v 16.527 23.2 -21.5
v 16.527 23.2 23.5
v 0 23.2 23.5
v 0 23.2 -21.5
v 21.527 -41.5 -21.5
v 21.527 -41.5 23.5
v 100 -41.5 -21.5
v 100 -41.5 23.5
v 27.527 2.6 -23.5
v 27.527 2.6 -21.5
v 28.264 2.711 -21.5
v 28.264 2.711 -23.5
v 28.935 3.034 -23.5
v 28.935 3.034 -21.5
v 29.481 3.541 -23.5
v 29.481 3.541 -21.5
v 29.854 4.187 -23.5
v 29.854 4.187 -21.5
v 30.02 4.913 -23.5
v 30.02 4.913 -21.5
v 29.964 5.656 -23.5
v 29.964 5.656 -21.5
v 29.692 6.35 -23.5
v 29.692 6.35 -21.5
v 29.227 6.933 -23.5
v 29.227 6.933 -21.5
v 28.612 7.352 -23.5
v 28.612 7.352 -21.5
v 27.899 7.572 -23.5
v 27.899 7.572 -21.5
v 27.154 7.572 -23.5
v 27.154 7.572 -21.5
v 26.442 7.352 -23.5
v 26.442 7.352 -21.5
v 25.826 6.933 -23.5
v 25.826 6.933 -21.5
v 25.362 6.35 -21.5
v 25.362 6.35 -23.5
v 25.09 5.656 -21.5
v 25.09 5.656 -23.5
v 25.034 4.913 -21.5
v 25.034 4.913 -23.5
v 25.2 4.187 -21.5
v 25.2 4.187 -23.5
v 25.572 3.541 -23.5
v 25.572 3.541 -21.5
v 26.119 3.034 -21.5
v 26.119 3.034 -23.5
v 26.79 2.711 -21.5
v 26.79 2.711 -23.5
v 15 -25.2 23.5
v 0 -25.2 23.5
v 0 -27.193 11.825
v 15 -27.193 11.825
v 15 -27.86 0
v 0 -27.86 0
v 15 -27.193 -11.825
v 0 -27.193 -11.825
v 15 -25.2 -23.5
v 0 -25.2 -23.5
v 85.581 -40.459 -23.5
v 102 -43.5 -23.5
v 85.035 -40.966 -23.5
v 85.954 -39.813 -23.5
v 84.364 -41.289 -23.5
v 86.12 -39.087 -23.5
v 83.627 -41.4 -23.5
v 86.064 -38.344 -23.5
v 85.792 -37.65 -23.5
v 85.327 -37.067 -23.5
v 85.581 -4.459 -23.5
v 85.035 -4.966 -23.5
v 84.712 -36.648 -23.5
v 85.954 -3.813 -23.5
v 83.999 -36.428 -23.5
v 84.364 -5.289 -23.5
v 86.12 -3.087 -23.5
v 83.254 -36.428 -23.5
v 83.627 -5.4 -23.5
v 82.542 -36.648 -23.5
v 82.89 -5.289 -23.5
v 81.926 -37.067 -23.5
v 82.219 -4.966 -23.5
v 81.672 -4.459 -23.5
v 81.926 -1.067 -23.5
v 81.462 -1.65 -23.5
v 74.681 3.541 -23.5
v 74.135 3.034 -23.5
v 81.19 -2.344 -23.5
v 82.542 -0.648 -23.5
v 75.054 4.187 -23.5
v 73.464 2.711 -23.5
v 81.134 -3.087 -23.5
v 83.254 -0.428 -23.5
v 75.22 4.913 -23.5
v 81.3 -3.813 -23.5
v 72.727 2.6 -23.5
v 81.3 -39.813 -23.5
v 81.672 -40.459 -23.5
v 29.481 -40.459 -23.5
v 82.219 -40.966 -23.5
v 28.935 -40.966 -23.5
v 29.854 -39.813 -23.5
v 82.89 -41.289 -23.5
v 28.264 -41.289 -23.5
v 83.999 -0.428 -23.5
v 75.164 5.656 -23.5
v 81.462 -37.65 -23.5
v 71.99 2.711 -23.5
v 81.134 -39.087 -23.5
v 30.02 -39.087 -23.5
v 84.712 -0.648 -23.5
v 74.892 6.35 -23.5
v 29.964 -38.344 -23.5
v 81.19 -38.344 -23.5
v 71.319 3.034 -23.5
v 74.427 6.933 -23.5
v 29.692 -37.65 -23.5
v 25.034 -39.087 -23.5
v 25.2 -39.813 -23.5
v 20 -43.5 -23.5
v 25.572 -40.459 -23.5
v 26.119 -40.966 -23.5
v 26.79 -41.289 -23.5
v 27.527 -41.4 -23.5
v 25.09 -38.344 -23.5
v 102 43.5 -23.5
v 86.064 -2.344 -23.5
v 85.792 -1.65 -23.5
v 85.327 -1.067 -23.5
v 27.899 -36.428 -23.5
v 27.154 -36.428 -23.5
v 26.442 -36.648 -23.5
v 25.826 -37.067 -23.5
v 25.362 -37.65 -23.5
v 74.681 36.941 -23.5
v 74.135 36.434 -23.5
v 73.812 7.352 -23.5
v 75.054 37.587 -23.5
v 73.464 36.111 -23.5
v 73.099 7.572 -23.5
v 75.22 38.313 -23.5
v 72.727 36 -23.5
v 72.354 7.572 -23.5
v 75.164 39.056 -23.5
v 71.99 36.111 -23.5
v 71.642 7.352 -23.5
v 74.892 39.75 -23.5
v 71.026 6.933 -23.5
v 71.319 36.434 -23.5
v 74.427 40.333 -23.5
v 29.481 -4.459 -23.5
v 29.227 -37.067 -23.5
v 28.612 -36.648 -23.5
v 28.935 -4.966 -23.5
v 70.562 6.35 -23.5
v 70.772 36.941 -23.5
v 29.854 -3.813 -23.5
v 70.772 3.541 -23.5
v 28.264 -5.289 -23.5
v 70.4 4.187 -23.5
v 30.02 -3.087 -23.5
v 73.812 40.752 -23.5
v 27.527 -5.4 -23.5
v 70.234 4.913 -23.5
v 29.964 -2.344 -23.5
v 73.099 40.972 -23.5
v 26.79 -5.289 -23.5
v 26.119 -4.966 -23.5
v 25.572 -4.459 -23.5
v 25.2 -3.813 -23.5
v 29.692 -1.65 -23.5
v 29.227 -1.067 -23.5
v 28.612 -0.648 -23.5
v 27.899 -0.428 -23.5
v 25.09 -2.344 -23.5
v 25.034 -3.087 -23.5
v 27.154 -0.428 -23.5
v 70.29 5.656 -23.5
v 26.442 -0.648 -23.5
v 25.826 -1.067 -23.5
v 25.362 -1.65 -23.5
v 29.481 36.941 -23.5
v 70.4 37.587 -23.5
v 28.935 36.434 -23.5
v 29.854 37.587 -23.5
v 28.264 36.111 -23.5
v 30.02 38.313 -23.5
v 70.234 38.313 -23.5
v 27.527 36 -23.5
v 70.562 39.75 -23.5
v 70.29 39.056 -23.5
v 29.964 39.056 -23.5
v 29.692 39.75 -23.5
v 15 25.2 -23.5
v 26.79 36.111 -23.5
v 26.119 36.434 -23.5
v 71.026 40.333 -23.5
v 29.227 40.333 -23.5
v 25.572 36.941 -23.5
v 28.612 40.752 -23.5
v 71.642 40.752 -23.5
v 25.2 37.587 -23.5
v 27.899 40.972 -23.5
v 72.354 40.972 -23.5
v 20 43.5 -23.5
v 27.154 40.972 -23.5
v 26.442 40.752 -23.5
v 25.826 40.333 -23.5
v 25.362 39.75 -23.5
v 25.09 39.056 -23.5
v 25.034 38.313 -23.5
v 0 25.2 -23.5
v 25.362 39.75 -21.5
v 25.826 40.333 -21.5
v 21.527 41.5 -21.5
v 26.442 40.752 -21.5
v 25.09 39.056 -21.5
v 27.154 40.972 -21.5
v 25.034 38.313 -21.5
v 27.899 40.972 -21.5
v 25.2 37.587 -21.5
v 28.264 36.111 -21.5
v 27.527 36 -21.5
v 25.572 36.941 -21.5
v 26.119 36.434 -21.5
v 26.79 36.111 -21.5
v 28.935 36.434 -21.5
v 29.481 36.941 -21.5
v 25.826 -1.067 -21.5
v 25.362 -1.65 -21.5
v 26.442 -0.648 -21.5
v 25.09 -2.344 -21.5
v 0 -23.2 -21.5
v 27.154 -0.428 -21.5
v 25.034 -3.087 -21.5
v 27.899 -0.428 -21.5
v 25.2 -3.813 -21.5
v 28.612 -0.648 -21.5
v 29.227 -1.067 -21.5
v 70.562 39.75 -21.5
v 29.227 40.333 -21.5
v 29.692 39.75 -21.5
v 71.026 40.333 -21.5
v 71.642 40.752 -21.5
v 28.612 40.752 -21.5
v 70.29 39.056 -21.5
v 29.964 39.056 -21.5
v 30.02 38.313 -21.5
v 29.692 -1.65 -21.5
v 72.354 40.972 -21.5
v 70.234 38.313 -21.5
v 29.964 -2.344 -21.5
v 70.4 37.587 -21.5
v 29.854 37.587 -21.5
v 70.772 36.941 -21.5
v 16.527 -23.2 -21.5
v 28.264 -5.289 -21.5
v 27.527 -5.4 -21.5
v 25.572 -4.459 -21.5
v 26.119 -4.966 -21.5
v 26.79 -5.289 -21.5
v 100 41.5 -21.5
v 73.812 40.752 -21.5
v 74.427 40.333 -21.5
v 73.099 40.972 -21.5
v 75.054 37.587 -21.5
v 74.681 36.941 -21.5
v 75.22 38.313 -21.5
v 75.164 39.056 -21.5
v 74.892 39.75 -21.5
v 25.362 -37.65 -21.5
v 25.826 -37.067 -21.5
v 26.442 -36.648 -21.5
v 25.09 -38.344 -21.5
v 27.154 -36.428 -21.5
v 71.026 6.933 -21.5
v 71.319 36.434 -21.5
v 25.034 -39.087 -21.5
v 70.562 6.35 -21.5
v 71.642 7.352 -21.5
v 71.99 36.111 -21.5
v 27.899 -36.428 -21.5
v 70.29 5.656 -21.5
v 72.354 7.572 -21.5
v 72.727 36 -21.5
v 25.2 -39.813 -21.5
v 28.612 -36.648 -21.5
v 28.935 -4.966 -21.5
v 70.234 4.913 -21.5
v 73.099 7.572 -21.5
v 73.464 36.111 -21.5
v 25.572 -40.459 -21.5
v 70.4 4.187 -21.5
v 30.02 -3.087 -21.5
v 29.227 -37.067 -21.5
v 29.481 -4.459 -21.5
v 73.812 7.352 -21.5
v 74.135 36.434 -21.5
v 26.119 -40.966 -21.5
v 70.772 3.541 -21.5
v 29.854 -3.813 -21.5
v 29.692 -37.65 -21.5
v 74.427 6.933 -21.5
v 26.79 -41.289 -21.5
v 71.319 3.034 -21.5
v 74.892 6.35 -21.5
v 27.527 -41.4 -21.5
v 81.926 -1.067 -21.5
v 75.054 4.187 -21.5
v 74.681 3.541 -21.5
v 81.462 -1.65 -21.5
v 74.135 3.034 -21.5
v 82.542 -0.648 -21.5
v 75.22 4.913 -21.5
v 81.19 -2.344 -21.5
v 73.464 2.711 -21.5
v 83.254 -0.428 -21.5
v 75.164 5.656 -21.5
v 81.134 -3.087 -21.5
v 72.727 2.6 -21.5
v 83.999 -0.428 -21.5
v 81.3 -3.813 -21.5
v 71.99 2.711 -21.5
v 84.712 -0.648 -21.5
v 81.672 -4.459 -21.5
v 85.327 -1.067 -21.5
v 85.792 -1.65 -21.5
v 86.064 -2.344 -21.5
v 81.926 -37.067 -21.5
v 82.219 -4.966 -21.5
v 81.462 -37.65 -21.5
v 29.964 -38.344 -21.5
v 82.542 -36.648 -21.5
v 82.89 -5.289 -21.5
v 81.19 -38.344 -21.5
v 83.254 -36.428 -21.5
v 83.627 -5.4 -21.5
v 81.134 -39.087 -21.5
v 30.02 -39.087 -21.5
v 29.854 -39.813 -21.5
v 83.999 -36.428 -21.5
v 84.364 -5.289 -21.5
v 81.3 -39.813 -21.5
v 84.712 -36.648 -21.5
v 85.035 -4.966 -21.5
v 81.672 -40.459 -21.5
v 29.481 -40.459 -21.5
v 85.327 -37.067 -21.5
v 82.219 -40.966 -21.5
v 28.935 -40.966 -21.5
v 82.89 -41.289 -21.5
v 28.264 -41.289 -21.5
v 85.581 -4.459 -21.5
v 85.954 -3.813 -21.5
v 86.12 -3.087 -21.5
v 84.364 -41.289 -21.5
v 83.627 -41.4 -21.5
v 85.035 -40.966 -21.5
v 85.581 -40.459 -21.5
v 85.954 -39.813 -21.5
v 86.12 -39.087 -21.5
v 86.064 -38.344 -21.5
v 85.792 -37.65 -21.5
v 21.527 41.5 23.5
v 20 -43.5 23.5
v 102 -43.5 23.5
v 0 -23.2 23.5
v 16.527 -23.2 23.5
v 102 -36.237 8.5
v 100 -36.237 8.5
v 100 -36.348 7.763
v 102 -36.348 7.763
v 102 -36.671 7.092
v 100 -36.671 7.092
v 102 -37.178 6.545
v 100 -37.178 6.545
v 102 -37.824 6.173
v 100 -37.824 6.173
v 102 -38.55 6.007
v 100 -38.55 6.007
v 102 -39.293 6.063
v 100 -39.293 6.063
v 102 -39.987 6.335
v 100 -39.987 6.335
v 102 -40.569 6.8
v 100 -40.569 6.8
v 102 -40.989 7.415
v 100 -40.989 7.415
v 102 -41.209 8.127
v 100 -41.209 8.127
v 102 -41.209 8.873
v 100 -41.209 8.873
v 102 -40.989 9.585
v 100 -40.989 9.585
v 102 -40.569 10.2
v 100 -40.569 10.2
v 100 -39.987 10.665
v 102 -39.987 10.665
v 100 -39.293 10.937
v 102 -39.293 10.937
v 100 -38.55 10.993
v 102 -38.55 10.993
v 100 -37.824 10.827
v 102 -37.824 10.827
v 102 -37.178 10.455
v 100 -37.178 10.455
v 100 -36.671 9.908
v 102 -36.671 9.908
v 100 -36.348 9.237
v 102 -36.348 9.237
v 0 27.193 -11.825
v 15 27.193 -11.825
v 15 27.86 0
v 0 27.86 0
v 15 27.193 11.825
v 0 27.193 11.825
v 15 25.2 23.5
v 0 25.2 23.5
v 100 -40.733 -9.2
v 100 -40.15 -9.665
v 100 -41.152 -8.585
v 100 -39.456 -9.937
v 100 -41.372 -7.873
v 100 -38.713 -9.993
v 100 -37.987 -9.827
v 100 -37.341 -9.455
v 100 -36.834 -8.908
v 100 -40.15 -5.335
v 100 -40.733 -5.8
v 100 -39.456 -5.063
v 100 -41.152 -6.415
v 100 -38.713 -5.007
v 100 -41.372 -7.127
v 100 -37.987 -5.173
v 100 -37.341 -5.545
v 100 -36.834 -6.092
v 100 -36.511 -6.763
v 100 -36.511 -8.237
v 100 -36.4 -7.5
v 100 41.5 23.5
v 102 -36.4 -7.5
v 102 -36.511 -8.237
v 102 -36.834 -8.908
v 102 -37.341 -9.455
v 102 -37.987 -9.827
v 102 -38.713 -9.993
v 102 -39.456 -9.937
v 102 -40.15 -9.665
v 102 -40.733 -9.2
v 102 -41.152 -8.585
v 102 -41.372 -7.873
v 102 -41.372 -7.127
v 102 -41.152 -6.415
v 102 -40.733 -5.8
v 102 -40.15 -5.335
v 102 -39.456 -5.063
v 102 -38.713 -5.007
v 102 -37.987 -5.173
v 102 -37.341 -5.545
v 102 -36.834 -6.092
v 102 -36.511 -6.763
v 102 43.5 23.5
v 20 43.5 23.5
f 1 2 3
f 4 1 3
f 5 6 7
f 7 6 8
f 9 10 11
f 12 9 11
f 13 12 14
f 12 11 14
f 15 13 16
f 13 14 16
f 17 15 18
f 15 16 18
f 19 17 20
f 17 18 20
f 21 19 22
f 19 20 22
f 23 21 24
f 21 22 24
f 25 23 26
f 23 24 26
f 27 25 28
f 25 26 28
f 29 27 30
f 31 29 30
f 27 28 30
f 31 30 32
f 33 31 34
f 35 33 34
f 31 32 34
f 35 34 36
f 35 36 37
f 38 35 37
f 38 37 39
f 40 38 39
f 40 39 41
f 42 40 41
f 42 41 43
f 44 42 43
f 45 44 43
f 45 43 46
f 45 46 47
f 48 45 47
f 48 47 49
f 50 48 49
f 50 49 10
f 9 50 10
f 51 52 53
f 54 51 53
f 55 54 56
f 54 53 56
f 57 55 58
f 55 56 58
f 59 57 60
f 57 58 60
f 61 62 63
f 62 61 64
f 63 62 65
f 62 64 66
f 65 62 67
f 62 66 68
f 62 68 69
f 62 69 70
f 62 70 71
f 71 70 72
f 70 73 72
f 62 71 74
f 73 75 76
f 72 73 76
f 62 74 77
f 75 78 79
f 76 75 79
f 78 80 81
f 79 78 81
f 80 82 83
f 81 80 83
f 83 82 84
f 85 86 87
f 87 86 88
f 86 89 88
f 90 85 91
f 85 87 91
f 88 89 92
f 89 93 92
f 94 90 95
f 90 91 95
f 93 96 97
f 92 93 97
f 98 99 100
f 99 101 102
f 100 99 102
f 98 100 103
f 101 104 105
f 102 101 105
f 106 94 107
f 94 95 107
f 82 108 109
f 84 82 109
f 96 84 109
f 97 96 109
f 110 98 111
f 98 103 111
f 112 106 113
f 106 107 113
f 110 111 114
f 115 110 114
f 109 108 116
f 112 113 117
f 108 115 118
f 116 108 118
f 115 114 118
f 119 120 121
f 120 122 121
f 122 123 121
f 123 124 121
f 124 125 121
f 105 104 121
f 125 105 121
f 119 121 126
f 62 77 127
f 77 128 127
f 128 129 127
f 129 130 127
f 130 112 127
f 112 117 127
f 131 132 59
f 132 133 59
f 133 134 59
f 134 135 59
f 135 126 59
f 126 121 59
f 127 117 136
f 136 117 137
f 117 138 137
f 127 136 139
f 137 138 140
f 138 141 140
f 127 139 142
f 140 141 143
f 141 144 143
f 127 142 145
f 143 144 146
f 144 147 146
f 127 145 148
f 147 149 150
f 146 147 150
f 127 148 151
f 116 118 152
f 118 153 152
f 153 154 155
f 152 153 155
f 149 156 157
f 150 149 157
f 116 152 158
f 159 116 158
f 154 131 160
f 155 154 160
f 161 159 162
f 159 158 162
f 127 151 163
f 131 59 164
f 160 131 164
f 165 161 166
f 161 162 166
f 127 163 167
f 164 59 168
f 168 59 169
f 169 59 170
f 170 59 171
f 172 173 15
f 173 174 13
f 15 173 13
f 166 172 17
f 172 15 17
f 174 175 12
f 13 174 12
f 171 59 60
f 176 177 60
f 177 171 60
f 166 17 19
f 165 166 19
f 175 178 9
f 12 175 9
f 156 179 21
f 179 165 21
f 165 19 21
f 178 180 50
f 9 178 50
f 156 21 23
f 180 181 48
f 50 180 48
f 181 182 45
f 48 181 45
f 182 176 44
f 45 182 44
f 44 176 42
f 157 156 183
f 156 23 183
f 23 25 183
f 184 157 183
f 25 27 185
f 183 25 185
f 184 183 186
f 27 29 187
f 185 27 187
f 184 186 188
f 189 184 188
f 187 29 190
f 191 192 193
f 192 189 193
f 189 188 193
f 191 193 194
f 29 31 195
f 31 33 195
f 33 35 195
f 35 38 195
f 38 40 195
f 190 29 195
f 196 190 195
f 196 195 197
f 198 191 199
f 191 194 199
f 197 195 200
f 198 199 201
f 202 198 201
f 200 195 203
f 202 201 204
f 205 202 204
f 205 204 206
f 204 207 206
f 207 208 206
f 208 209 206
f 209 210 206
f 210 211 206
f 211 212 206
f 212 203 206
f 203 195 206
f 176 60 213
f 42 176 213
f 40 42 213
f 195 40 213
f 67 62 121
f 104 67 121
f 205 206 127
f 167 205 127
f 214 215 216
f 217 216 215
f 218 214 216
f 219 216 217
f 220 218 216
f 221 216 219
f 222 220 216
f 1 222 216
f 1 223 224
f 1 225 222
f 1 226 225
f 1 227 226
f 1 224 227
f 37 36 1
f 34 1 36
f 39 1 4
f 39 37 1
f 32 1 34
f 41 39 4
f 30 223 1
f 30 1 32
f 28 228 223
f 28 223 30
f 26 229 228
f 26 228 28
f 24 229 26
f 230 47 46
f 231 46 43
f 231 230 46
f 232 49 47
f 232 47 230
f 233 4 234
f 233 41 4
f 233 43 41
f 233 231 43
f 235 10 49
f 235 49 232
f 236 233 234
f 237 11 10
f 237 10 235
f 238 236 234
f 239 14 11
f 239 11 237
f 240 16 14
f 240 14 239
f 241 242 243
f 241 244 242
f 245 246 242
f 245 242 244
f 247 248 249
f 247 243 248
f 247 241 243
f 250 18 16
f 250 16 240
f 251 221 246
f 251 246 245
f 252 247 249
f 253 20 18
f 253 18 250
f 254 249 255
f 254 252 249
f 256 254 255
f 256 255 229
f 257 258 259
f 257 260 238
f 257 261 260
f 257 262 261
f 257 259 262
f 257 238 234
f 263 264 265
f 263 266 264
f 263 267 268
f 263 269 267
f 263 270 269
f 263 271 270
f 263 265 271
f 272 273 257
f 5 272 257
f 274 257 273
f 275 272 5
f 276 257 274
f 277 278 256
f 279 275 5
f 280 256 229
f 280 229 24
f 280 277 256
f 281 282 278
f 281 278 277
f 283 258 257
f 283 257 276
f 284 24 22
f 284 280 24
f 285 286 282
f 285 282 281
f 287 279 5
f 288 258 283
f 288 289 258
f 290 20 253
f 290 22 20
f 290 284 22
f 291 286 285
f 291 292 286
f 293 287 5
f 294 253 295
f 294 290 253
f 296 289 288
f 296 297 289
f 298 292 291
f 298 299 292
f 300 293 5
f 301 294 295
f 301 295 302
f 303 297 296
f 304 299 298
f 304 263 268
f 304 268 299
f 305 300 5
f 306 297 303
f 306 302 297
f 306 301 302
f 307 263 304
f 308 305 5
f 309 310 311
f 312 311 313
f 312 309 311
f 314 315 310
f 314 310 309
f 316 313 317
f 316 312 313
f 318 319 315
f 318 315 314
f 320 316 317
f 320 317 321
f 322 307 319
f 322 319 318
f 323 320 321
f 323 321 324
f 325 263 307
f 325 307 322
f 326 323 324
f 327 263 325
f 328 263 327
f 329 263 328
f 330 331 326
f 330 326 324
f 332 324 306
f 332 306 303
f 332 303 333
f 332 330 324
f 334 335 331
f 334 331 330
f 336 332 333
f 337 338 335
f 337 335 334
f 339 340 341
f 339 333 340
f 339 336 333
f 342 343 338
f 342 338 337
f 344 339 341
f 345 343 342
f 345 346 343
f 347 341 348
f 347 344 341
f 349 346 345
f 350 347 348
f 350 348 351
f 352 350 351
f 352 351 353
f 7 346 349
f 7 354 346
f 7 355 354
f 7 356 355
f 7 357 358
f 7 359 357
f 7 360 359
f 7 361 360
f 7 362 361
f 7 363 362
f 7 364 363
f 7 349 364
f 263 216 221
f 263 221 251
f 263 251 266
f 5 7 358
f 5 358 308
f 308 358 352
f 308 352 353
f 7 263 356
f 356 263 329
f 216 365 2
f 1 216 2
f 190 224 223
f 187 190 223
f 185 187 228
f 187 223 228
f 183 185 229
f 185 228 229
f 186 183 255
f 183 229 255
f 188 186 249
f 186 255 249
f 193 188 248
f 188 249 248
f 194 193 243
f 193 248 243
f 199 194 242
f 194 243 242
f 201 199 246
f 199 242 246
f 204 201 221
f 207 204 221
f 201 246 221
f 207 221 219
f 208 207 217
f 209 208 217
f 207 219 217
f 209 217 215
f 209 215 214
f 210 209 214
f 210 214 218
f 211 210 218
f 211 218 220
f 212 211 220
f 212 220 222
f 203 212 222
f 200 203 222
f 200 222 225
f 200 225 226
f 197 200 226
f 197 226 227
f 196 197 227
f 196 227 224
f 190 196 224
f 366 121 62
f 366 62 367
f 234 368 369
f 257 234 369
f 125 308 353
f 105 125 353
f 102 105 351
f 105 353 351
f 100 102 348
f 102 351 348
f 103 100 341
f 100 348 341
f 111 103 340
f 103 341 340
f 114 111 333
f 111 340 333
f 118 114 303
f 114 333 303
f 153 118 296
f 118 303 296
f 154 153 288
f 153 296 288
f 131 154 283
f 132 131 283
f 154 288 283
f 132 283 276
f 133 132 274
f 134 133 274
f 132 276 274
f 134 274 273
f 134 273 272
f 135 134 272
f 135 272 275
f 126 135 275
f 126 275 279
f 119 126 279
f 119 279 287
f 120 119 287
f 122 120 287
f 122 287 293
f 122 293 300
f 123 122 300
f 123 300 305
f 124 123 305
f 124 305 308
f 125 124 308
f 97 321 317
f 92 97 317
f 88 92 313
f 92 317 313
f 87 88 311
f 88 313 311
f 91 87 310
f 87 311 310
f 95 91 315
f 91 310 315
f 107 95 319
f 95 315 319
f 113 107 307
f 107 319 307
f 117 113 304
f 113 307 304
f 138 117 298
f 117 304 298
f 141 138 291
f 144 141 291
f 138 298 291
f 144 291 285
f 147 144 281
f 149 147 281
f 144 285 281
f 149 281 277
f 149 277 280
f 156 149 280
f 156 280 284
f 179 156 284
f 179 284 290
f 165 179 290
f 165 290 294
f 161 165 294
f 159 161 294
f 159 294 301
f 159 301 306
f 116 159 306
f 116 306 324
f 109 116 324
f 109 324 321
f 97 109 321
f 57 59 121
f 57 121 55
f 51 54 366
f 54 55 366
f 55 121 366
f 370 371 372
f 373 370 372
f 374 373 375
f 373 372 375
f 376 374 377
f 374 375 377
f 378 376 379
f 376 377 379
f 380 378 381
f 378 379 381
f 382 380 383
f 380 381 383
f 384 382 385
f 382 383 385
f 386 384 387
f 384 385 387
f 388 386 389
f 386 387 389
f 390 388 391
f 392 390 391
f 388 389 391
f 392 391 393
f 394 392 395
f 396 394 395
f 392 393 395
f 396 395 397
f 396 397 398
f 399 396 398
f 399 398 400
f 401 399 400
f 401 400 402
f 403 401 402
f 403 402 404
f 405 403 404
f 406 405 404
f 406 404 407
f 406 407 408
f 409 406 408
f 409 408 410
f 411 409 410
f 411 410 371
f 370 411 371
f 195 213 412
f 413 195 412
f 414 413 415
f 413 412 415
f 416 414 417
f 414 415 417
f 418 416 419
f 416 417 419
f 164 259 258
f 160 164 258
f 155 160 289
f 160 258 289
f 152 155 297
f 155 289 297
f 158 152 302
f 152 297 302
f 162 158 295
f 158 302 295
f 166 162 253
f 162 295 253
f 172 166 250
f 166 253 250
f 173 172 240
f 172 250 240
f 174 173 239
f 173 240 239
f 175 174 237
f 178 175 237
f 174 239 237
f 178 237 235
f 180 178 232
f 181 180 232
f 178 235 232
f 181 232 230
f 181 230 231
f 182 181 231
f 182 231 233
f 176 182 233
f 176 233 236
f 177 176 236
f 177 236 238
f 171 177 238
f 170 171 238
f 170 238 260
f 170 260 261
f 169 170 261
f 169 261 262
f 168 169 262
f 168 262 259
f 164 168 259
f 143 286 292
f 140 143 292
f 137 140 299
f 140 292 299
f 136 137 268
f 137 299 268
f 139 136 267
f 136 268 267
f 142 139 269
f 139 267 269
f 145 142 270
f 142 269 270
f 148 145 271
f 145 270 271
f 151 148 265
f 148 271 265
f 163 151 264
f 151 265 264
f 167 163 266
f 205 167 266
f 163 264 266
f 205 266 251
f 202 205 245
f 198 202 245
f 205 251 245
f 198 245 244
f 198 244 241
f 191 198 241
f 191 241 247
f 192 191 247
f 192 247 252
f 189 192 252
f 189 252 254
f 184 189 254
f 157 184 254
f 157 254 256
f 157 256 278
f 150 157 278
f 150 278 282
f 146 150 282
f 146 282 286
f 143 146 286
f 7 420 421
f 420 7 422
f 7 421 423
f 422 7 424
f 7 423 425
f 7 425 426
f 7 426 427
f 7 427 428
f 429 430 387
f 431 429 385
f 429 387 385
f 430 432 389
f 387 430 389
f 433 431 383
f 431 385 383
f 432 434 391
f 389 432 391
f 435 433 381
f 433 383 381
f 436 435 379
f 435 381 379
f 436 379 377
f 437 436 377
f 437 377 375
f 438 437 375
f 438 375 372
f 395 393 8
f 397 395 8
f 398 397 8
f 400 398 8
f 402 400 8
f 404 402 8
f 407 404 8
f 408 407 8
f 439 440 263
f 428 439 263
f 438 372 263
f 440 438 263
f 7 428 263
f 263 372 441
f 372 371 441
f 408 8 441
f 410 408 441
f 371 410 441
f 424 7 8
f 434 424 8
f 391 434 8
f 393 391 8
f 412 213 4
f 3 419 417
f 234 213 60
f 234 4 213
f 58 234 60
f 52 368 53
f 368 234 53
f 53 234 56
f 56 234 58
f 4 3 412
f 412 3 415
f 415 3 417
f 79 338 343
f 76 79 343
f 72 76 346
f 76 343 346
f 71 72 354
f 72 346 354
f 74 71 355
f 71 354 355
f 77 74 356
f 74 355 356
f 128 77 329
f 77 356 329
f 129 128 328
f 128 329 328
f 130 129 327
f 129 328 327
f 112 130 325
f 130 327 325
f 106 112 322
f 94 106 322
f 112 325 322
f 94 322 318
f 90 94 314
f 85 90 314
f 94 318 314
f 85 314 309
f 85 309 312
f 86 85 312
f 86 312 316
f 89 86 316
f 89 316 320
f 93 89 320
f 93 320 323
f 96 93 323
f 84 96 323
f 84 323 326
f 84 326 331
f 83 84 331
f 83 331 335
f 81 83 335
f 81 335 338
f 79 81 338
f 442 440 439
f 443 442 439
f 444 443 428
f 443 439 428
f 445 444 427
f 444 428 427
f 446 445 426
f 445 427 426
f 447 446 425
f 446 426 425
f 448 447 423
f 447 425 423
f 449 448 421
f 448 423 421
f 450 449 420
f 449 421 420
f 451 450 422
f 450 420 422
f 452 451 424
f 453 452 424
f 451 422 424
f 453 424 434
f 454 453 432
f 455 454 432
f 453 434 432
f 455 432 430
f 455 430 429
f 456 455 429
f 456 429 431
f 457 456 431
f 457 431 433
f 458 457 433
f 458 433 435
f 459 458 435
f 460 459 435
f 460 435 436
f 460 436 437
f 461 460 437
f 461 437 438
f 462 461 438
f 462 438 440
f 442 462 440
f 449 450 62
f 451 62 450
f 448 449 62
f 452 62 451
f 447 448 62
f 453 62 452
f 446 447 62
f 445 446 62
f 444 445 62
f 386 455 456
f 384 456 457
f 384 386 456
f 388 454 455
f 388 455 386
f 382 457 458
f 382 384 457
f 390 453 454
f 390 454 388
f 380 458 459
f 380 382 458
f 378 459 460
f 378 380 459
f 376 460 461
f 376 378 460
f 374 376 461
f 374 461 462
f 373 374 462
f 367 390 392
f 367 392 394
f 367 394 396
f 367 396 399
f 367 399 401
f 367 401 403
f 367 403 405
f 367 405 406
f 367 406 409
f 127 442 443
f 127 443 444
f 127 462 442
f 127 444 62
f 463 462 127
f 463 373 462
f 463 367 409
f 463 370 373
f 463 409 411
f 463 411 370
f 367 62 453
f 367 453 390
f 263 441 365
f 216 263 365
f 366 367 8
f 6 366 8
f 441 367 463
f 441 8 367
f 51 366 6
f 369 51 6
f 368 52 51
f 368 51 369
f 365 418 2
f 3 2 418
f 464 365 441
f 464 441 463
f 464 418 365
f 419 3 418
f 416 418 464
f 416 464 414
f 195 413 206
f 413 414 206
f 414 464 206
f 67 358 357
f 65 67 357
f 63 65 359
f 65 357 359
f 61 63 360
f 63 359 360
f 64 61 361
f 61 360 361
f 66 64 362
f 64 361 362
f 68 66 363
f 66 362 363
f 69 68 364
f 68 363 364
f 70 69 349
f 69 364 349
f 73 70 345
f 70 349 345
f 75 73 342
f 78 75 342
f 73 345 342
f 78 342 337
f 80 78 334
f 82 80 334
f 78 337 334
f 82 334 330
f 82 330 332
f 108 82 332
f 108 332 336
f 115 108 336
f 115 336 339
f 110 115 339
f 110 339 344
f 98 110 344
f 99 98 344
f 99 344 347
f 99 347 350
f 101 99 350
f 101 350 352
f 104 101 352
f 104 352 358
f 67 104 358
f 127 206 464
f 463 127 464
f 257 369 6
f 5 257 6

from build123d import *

# Parameters (mm, degrees)
PAD_DEPTH       = 15
SKETCH001_W     = 87
SKETCH001_H     = 47
SKETCH003_W     = 87
SKETCH003_H     = 47
PAD001_DEPTH    = 82
POCKET_DEPTH    = 45
SKETCH009_R     = 2.5
POCKET001_DEPTH = 5
SKETCH010_R     = 2.5
POCKET002_DEPTH = 5


with BuildPart() as part:
    # Sketch → Pad (new body)
    with BuildSketch(Plane.YZ):
        with BuildLine():
            Line((-25.2, 23.5), (25.2, 23.5))
            ThreePointArc((25.2, -23.5), (27.86, 0), (25.2, 23.5))
            Line((25.2, -23.5), (-25.2, -23.5))
            ThreePointArc((-25.2, 23.5), (-27.86, 0), (-25.2, -23.5))
        make_face()
    extrude(amount=PAD_DEPTH)

    # Sketch002 (on Face6 of Pad) → AdditiveLoft section 0
    with BuildSketch(Plane.YZ.offset(15)):
        with BuildLine():
            Line((-25.2, 23.5), (25.2, 23.5))
            ThreePointArc((25.2, -23.5), (27.86, 0), (25.2, 23.5))
            Line((-25.2, -23.5), (25.2, -23.5))
            ThreePointArc((-25.2, 23.5), (-27.86, 0), (-25.2, -23.5))
        make_face()
    # Sketch001 → AdditiveLoft section 1
    with BuildSketch(Plane.YZ.offset(20)):
        Rectangle(SKETCH001_W, SKETCH001_H)
    loft()

    # Sketch003 (on Face10 of AdditiveLoft) → Pad001 (join)
    with BuildSketch(Plane.YZ.offset(20)):
        Rectangle(SKETCH003_W, SKETCH003_H)
    extrude(amount=PAD001_DEPTH)

    # Sketch008 (on Face10 of Pad001) → Pocket (cut)
    with BuildSketch(Plane(origin=(0, 0, 23.5), x_dir=(0, -1, 0), z_dir=(0, 0, 1))):
        Polygon((-41.5, 100), (-41.5, 21.52686), (-23.2, 16.52686), (-23.2, 0), (23.2, 0), (23.2, 16.52686), (41.5, 21.52686), (41.5, 100), align=None)
    extrude(amount=-POCKET_DEPTH, mode=Mode.SUBTRACT)

    # Sketch009 (on Face7 of Pocket) → Pocket001 (cut)
    with BuildSketch(Plane(origin=(0, 0, -21.5), x_dir=(0, -1, 0), z_dir=(0, 0, 1))):
        with Locations((-38.5, 27.52686)):
            Circle(SKETCH009_R)
        with Locations((-5.1, 27.52686)):
            Circle(SKETCH009_R)
        with Locations((-38.5, 72.72686)):
            Circle(SKETCH009_R)
        with Locations((-5.1, 72.72686)):
            Circle(SKETCH009_R)
        with Locations((2.9, 27.52686)):
            Circle(SKETCH009_R)
        with Locations((38.9, 27.52686)):
            Circle(SKETCH009_R)
        with Locations((2.9, 83.62686)):
            Circle(SKETCH009_R)
        with Locations((38.9, 83.62686)):
            Circle(SKETCH009_R)
    extrude(amount=-POCKET001_DEPTH, mode=Mode.SUBTRACT)

    # Sketch010 (on Face17 of Pocket001) → Pocket002 (cut)
    with BuildSketch(Plane(origin=(100, 0, 0), x_dir=(0, 1, 0), z_dir=(-1, 0, 0))):
        with Locations((-38.9, 7.5)):
            Circle(SKETCH010_R)
        with Locations((-38.73686, -8.5)):
            Circle(SKETCH010_R)
    extrude(amount=-POCKET002_DEPTH, mode=Mode.SUBTRACT)


solid = part.part
